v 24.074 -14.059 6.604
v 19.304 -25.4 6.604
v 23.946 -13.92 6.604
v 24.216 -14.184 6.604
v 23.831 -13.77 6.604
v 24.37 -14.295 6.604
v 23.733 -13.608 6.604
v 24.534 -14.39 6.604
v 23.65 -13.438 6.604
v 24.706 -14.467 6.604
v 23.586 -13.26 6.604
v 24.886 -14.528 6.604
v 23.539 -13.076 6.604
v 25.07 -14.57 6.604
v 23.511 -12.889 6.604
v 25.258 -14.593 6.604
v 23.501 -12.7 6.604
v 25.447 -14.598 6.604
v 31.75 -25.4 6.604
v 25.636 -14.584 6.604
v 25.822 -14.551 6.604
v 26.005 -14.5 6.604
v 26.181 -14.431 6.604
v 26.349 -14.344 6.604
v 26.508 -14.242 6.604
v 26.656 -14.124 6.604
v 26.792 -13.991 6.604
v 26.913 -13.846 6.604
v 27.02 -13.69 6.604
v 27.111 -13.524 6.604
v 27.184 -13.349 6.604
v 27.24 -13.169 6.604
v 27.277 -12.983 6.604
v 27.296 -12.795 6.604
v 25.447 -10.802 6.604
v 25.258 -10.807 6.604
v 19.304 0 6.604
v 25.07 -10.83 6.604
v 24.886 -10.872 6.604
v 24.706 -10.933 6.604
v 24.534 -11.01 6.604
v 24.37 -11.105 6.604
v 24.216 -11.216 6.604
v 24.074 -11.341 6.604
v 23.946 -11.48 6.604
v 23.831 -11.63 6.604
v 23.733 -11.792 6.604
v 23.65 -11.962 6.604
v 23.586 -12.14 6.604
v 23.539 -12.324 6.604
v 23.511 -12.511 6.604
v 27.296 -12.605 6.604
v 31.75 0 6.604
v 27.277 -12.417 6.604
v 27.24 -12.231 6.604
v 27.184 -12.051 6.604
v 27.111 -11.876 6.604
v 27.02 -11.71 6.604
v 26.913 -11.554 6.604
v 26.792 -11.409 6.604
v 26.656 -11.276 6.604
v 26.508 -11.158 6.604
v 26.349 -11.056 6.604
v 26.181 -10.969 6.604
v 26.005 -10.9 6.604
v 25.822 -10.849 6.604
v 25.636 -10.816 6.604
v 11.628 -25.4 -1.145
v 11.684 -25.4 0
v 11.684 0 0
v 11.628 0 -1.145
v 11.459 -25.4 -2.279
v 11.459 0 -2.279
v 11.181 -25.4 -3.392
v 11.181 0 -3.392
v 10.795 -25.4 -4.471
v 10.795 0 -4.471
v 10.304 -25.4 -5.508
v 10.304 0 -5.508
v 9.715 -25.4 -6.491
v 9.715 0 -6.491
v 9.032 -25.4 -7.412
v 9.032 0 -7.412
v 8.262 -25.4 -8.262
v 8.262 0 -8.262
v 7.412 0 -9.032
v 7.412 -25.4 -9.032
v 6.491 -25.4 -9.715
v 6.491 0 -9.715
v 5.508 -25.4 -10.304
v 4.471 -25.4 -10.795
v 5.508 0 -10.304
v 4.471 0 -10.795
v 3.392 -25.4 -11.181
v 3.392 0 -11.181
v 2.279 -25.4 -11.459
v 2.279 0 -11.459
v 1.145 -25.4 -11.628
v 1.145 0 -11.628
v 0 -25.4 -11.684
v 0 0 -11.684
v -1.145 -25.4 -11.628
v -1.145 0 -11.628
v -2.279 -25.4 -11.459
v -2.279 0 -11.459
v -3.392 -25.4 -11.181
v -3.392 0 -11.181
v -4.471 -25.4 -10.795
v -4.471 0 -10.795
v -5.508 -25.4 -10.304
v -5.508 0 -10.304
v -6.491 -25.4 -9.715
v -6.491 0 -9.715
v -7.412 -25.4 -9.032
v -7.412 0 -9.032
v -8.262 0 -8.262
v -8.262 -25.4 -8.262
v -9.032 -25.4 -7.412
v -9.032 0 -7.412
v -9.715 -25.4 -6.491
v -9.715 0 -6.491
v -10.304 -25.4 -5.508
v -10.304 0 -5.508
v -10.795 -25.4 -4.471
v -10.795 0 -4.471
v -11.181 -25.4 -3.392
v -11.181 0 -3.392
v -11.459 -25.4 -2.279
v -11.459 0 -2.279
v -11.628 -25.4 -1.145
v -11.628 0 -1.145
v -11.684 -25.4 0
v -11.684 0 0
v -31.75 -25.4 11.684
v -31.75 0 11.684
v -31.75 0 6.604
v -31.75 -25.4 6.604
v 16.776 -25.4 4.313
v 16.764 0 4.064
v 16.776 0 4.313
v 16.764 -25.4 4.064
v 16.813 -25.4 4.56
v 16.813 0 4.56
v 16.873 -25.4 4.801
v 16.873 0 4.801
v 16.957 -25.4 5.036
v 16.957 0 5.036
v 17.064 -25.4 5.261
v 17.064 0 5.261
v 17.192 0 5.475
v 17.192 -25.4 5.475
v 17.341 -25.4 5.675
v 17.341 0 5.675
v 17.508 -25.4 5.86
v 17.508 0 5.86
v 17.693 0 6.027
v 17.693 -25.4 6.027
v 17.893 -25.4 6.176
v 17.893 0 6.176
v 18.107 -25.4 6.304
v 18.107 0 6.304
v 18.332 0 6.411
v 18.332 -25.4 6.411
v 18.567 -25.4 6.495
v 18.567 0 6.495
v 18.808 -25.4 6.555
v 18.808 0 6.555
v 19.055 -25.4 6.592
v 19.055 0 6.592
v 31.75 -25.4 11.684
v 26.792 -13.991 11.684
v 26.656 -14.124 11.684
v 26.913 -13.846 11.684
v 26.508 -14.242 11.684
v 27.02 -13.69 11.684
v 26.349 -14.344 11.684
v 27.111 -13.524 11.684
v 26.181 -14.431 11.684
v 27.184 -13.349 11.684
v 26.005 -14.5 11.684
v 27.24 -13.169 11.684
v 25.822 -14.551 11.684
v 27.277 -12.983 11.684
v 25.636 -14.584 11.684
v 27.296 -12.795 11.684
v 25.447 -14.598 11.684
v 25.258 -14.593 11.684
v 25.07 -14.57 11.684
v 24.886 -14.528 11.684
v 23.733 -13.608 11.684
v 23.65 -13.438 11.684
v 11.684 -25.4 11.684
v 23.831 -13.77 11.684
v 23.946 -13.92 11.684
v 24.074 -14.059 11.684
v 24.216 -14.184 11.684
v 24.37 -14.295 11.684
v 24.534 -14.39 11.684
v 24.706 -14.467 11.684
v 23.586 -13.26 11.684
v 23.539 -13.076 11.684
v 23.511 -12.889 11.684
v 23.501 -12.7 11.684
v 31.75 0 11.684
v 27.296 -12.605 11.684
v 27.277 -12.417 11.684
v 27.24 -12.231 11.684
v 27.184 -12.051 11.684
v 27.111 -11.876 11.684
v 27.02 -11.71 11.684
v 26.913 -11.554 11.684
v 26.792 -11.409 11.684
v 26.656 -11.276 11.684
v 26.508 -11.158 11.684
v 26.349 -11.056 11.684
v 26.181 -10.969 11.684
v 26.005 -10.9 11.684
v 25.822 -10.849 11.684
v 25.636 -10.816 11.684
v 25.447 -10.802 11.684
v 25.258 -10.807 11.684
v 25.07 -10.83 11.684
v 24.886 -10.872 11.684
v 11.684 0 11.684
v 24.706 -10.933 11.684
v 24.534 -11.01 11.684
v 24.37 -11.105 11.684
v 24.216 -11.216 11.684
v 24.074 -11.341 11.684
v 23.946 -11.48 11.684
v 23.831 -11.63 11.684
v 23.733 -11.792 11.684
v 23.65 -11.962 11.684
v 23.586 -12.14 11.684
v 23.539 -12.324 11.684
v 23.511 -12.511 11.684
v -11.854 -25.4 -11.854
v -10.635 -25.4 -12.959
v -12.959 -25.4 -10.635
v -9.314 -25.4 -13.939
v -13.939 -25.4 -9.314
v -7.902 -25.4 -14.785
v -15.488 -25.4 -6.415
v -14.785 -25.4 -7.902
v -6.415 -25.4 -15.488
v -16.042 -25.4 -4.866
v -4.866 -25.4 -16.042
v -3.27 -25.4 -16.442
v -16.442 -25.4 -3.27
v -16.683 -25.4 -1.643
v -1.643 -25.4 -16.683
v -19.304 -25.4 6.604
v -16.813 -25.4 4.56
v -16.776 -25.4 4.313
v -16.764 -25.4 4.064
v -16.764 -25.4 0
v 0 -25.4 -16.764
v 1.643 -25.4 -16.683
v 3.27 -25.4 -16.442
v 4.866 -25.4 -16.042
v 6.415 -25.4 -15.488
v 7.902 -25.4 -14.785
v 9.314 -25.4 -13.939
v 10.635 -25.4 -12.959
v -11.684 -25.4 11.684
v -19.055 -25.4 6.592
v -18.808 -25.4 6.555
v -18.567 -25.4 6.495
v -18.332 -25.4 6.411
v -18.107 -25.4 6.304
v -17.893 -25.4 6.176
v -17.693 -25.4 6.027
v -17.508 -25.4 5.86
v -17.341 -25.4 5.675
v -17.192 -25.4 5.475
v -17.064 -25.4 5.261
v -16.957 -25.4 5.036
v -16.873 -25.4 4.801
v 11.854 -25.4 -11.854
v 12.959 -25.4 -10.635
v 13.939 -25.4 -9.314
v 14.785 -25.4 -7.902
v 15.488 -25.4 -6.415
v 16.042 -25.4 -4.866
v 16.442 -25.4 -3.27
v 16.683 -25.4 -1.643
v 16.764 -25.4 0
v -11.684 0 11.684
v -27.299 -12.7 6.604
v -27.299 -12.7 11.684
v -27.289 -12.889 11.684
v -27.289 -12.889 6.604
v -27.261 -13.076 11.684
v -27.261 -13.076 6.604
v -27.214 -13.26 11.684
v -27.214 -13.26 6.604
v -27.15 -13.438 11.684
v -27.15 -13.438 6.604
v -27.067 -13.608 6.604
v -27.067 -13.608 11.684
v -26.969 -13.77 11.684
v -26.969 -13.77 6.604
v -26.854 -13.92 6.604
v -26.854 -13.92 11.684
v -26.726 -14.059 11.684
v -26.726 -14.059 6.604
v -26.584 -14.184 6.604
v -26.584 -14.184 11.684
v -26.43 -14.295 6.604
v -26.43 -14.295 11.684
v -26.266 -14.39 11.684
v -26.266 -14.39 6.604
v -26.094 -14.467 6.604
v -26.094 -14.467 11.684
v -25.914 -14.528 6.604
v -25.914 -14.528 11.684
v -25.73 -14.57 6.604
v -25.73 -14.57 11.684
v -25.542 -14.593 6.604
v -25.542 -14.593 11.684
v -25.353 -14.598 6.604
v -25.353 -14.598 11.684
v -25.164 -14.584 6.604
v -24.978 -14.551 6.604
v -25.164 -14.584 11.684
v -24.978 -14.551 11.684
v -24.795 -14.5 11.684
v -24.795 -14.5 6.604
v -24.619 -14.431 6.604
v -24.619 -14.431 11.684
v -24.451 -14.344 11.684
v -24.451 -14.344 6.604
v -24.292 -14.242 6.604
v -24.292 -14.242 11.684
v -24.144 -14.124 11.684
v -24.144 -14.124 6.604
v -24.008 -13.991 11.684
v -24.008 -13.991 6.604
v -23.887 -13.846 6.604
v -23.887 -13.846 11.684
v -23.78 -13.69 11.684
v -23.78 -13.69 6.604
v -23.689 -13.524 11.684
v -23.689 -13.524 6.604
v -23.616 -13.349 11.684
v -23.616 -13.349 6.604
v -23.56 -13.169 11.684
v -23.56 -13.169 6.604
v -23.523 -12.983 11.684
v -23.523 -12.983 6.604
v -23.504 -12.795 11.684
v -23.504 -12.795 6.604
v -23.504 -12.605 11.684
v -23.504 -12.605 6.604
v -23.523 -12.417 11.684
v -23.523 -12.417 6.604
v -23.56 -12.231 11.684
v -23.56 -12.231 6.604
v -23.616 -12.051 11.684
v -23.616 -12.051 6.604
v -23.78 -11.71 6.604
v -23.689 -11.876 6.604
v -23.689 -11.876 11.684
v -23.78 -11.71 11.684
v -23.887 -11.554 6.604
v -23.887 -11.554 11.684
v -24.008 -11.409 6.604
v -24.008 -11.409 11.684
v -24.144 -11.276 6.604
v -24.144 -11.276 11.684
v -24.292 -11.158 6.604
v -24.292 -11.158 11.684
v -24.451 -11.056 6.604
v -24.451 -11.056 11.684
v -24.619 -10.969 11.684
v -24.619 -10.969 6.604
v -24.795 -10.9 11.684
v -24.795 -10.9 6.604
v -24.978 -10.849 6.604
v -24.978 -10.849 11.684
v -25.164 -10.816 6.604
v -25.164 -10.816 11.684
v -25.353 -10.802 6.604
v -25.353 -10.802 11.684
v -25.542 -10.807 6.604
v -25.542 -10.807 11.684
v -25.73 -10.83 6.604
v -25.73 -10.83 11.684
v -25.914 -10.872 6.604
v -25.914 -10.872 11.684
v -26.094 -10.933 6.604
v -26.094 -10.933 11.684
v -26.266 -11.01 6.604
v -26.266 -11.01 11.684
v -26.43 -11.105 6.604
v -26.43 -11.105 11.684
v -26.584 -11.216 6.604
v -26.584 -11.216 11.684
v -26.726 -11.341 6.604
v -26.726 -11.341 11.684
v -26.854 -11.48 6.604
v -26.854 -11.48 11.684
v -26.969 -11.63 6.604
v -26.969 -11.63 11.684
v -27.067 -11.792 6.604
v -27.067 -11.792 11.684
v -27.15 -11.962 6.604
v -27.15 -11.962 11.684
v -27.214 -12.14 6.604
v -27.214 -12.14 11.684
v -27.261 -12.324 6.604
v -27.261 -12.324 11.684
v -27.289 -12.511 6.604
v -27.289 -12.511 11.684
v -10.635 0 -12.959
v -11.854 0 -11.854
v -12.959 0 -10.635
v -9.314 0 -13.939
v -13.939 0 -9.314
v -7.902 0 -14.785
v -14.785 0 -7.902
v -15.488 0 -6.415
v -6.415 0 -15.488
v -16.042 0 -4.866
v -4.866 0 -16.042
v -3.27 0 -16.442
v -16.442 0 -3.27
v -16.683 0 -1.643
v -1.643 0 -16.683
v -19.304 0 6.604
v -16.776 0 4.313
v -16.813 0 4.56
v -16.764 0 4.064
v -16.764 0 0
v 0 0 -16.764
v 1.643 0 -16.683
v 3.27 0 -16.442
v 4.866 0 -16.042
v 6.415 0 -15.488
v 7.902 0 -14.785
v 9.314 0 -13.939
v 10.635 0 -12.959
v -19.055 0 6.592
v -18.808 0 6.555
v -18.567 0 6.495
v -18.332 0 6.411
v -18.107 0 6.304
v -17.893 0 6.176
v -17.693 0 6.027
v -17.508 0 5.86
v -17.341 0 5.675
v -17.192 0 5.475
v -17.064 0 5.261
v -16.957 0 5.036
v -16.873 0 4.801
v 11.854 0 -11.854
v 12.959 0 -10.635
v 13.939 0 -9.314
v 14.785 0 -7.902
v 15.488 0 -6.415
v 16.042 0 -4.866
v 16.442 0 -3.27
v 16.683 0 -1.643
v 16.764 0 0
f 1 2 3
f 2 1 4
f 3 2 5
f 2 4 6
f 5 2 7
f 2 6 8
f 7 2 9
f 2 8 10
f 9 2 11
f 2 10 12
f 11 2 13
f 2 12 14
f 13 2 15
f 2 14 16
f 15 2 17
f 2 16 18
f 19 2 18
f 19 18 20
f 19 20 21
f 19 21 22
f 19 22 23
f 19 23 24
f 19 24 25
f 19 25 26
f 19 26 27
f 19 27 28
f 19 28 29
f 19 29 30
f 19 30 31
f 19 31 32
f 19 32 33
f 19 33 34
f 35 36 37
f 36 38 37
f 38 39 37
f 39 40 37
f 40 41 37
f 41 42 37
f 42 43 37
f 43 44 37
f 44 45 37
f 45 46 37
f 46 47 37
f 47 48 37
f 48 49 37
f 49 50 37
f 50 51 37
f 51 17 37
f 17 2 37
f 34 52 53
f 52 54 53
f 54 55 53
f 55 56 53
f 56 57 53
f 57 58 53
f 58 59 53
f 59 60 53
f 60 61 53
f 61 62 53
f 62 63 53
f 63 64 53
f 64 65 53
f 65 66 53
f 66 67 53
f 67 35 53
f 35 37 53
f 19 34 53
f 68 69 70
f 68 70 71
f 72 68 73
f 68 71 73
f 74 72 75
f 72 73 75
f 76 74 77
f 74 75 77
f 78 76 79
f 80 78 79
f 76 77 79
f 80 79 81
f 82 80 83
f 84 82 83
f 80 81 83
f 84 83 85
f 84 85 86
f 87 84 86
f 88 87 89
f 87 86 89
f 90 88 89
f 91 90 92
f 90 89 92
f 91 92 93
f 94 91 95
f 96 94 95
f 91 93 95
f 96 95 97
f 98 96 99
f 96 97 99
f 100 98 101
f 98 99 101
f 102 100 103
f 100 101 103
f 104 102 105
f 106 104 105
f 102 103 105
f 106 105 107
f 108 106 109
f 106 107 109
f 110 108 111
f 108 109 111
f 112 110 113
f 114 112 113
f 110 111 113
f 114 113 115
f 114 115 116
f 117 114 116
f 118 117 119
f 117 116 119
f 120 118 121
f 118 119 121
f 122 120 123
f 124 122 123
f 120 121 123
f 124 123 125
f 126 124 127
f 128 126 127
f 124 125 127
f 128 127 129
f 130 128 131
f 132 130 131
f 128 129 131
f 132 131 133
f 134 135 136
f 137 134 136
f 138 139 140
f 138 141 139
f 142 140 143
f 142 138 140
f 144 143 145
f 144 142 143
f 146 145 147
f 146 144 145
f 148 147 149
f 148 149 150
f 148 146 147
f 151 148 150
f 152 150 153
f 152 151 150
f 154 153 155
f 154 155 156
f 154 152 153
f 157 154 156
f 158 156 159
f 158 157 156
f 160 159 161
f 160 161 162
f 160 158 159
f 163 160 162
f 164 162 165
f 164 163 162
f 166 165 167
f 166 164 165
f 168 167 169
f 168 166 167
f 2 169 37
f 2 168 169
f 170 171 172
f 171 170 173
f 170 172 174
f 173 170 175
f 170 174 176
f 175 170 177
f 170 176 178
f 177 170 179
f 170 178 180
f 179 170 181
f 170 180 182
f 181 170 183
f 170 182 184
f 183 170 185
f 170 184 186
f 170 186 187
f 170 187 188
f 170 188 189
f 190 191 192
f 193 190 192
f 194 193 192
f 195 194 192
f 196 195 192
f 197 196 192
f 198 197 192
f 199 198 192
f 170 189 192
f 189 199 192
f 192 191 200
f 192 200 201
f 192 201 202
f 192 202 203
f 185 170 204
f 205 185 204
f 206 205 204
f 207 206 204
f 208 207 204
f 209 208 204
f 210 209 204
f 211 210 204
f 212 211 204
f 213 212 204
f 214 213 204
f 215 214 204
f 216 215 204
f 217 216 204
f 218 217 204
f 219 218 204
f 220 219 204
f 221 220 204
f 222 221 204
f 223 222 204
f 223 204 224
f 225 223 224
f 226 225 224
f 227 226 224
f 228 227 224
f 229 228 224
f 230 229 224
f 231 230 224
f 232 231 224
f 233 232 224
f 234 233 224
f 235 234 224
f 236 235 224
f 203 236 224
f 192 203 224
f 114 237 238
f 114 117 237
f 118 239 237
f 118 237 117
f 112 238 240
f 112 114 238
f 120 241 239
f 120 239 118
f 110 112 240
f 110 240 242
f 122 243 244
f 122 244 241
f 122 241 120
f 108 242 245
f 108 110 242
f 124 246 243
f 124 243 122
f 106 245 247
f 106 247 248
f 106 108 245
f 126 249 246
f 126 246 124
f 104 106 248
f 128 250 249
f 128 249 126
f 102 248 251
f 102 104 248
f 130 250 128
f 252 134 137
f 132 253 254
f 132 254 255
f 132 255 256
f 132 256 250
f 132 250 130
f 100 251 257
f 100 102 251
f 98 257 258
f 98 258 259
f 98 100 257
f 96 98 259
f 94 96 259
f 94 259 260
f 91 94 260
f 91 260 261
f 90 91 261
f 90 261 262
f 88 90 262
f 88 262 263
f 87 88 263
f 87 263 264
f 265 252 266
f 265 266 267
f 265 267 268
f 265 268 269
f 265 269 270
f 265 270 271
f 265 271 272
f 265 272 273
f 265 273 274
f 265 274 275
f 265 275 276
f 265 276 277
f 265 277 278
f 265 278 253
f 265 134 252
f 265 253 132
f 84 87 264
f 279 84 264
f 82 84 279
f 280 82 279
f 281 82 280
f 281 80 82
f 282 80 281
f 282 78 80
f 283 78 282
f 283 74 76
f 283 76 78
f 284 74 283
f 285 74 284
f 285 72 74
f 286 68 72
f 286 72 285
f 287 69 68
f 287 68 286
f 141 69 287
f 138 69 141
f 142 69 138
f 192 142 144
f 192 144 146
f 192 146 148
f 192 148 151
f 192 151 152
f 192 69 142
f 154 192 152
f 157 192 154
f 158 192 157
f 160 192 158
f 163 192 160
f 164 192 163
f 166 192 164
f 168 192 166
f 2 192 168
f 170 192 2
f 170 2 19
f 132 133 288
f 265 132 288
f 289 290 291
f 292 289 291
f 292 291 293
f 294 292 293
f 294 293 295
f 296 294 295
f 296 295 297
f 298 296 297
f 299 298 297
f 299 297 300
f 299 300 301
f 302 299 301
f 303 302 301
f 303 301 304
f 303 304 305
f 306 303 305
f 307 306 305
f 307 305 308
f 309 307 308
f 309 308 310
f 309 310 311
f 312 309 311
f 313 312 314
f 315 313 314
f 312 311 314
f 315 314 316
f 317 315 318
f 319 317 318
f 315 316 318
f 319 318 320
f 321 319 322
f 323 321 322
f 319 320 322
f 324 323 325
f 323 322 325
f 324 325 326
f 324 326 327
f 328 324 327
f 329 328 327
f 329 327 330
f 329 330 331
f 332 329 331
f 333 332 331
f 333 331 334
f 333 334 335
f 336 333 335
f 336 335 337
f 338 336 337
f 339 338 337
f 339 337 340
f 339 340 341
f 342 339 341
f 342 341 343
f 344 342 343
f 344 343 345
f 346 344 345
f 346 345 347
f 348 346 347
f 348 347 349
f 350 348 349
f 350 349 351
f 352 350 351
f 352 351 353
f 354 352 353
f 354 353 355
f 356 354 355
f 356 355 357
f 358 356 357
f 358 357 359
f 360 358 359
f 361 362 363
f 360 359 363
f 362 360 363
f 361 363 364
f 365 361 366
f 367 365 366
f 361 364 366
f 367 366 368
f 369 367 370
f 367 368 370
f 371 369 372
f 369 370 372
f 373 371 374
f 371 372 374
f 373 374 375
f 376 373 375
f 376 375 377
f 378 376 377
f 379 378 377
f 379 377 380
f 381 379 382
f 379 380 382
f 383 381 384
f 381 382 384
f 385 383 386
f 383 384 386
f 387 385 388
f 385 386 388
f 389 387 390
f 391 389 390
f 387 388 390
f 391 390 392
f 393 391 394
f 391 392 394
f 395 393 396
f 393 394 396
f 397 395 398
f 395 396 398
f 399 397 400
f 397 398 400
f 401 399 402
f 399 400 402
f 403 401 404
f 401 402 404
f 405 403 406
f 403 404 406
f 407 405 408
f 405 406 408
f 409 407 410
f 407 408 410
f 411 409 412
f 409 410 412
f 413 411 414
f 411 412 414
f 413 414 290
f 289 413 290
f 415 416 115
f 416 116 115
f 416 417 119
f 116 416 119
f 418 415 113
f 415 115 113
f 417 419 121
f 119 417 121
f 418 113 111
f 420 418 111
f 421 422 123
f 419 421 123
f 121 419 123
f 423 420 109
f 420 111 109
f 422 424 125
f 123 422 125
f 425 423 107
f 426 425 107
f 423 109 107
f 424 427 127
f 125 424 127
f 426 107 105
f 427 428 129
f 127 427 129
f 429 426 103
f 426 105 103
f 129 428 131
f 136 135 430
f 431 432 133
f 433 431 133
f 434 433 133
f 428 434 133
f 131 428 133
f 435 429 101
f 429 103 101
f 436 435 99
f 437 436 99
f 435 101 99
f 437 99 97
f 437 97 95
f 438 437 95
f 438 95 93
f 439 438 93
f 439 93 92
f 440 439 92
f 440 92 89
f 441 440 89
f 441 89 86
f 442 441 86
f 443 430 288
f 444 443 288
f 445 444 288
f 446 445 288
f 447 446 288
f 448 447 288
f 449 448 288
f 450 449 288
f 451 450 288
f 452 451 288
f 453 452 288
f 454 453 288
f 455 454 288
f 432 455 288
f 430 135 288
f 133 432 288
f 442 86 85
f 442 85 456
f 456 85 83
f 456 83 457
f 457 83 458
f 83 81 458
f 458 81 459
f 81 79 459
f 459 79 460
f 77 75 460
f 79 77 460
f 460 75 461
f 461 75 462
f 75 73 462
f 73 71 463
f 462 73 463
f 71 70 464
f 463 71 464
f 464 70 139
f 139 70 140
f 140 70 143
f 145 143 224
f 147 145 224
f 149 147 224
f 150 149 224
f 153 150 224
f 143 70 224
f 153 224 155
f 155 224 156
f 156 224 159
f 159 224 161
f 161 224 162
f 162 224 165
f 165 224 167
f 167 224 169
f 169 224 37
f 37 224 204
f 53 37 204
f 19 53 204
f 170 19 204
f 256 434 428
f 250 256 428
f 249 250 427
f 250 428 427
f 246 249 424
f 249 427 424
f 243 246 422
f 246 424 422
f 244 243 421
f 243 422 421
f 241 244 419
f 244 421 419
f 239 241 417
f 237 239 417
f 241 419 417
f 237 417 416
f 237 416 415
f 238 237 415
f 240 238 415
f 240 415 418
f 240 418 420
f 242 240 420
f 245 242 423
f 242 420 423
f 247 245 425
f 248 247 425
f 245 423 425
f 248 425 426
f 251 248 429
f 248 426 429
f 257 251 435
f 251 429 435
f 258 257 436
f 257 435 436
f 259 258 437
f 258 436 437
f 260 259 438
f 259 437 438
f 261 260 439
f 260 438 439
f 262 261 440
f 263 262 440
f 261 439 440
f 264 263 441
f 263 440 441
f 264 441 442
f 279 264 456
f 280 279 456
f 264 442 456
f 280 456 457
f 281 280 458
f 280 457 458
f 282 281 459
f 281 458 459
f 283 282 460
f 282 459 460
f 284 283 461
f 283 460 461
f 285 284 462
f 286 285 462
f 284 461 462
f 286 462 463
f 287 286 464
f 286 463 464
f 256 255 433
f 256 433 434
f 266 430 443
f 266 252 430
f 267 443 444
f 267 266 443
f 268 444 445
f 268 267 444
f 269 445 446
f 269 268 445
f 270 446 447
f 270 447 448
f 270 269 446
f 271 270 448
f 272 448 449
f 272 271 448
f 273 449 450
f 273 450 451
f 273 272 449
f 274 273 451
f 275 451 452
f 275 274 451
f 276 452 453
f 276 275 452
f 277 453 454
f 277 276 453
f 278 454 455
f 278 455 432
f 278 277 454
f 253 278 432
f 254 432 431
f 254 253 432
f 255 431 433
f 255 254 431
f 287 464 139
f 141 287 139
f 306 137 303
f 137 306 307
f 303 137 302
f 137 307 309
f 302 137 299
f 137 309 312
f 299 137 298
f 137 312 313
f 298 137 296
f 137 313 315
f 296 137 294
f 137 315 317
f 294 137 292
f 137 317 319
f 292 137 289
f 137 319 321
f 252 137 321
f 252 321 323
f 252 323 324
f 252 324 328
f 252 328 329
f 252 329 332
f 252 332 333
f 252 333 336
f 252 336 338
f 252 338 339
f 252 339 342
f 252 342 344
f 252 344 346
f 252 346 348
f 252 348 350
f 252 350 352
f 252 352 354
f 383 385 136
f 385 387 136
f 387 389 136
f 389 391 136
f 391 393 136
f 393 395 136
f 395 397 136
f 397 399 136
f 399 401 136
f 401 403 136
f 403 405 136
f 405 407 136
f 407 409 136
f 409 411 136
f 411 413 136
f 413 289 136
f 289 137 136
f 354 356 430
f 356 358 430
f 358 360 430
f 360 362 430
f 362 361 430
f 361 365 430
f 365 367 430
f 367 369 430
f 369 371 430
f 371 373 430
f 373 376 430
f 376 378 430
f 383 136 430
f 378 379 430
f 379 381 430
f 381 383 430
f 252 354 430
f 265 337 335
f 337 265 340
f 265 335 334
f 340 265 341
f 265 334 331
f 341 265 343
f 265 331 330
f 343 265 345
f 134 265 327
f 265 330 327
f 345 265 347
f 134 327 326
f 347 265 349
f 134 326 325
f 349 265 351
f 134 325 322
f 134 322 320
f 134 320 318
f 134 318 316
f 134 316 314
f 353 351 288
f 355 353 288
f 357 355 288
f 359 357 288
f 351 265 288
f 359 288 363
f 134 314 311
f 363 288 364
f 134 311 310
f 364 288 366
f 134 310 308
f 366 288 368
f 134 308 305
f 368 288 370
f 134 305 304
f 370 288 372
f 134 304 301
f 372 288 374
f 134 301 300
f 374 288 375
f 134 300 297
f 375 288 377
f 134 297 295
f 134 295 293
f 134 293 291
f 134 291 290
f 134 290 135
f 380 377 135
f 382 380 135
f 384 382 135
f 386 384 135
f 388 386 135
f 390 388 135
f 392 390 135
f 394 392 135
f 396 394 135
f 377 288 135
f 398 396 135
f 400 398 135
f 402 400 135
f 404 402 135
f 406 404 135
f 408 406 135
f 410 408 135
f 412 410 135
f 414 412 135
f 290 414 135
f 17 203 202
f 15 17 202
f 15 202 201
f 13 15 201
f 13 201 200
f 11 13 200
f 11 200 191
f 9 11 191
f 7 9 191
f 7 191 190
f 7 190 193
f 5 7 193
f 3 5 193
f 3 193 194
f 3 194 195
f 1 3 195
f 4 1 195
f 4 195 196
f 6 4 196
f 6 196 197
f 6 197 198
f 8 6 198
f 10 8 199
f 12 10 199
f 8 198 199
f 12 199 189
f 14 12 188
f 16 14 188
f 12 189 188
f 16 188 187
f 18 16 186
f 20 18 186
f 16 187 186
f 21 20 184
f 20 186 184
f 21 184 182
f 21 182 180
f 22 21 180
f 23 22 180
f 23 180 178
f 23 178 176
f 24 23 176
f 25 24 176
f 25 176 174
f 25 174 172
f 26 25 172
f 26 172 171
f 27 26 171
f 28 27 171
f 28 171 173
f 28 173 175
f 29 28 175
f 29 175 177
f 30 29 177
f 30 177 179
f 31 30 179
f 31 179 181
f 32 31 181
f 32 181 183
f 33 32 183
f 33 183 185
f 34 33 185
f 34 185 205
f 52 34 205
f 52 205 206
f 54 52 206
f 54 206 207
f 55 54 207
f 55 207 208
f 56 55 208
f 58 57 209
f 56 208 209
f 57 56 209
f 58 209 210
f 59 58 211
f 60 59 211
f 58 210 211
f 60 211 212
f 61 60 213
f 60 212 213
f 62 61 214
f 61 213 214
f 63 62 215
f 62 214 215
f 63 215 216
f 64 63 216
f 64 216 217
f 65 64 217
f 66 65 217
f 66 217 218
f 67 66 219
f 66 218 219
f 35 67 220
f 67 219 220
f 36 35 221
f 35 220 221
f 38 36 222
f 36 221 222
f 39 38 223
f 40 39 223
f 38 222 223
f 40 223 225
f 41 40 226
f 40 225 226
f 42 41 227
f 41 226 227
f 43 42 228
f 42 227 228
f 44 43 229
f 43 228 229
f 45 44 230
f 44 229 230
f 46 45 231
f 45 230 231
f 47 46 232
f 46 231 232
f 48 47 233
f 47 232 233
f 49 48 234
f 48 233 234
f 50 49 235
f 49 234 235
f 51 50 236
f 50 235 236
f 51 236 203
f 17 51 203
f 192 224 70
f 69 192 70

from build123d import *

# Parameters (mm, degrees)
F1_DEPTH = 25.4
F3_D     = 3.7973
F3_DEPTH = 101.6
F3_TIP   = 1.1408240143
F4_R     = 2.54


with BuildPart() as f1:
    # F0 (on Front) → F1 (new body)
    with BuildSketch(Plane.XZ):
        with BuildLine():
            ThreePointArc((11.684, 0), (0, -11.684), (-11.684, 0))
            Line((-11.684, 0), (-11.684, 11.684))
            Line((-11.684, 11.684), (-31.75, 11.684))
            Line((-31.75, 11.684), (-31.75, 6.604))
            Line((-31.75, 6.604), (-16.764, 6.604))
            Line((-16.764, 6.604), (-16.764, 0))
            ThreePointArc((-16.764, 0), (0, -16.764), (16.764, 0))
            Line((16.764, 0), (16.764, 6.604))
            Line((16.764, 6.604), (31.75, 6.604))
            Line((31.75, 6.604), (31.75, 11.684))
            Line((31.75, 11.684), (11.684, 11.684))
            Line((11.684, 11.684), (11.684, 0))
        make_face()
    extrude(amount=F1_DEPTH)

    # F3
    with Locations(Plane(origin=(0, 0, 6.604), x_dir=(1, 0, 0), z_dir=(0, 0, -1))):
        with Locations((-25.4, 12.7), (25.4, 12.7)):
            Hole(F3_D / 2, depth=F3_DEPTH)
            with Locations((0, 0, -(F3_DEPTH + F3_TIP / 2))):  # 118° drill point
                Cone(0, F3_D / 2, F3_TIP, mode=Mode.SUBTRACT)

    # F4
    f4_edges = [f1.edges().sort_by_distance(p)[0] for p in [
        (16.764, -12.7, 6.604),
        (-16.764, -12.7, 6.604),
    ]]
    fillet(f4_edges, radius=F4_R)


solid = f1.part
